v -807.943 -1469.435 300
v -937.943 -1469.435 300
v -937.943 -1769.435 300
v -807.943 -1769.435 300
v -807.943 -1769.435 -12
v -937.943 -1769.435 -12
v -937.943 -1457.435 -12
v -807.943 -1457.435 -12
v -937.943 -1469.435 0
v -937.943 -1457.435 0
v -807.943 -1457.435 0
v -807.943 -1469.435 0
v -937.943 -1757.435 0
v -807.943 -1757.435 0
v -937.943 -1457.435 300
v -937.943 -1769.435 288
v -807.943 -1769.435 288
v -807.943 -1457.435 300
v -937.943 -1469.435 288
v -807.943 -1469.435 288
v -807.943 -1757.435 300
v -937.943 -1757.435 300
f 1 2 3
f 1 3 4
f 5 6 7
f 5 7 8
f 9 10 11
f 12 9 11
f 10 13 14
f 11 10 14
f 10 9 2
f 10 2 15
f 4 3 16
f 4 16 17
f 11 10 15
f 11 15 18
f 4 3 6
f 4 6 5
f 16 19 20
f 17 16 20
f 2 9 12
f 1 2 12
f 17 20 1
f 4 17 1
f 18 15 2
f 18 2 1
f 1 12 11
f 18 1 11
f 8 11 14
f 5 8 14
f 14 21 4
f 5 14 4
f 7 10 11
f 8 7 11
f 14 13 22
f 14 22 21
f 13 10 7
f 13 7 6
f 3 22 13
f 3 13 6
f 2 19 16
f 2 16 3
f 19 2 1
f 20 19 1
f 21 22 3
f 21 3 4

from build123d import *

# Parameters (mm, degrees)
F0_W     = 130
F0_H     = 12
F1_DEPTH = 300
F2_W     = 130
F2_H     = 12
F3_DEPTH = 300
F4_W     = 130
F4_H     = 312
F5_DEPTH = 12


with BuildPart() as f1:
    # F0 (on Top) → F1 (new body)
    with BuildSketch(Plane.XY):
        with Locations((-872.942913402, -1763.4354934643)):
            Rectangle(F0_W, F0_H)
    extrude(amount=F1_DEPTH)

    # F4 (on face) → F5 (join)
    with BuildSketch(Plane(origin=(0, 0, 0), x_dir=(1, 0, 0), z_dir=(0, 0, -1))):
        with Locations((-872.942913402, 1613.4354934643)):
            Rectangle(F4_W, F4_H)
    extrude(amount=F5_DEPTH)


with BuildPart() as f1b:
    # F0 (on Top) → F1, piece 2 (new body)
    with BuildSketch(Plane.XY):
        with Locations((-872.942913402, -1463.4354934643)):
            Rectangle(F0_W, F0_H)
    extrude(amount=F1_DEPTH)


with BuildPart() as f3:
    # F2 (on face) → F3 (new body)
    with BuildSketch(Plane.XZ.offset(1469.4354934643)):
        with Locations((-872.942913402, 294)):
            Rectangle(F2_W, F2_H)
    extrude(amount=F3_DEPTH)


solid = Compound([f1.part, f1b.part, f3.part])
